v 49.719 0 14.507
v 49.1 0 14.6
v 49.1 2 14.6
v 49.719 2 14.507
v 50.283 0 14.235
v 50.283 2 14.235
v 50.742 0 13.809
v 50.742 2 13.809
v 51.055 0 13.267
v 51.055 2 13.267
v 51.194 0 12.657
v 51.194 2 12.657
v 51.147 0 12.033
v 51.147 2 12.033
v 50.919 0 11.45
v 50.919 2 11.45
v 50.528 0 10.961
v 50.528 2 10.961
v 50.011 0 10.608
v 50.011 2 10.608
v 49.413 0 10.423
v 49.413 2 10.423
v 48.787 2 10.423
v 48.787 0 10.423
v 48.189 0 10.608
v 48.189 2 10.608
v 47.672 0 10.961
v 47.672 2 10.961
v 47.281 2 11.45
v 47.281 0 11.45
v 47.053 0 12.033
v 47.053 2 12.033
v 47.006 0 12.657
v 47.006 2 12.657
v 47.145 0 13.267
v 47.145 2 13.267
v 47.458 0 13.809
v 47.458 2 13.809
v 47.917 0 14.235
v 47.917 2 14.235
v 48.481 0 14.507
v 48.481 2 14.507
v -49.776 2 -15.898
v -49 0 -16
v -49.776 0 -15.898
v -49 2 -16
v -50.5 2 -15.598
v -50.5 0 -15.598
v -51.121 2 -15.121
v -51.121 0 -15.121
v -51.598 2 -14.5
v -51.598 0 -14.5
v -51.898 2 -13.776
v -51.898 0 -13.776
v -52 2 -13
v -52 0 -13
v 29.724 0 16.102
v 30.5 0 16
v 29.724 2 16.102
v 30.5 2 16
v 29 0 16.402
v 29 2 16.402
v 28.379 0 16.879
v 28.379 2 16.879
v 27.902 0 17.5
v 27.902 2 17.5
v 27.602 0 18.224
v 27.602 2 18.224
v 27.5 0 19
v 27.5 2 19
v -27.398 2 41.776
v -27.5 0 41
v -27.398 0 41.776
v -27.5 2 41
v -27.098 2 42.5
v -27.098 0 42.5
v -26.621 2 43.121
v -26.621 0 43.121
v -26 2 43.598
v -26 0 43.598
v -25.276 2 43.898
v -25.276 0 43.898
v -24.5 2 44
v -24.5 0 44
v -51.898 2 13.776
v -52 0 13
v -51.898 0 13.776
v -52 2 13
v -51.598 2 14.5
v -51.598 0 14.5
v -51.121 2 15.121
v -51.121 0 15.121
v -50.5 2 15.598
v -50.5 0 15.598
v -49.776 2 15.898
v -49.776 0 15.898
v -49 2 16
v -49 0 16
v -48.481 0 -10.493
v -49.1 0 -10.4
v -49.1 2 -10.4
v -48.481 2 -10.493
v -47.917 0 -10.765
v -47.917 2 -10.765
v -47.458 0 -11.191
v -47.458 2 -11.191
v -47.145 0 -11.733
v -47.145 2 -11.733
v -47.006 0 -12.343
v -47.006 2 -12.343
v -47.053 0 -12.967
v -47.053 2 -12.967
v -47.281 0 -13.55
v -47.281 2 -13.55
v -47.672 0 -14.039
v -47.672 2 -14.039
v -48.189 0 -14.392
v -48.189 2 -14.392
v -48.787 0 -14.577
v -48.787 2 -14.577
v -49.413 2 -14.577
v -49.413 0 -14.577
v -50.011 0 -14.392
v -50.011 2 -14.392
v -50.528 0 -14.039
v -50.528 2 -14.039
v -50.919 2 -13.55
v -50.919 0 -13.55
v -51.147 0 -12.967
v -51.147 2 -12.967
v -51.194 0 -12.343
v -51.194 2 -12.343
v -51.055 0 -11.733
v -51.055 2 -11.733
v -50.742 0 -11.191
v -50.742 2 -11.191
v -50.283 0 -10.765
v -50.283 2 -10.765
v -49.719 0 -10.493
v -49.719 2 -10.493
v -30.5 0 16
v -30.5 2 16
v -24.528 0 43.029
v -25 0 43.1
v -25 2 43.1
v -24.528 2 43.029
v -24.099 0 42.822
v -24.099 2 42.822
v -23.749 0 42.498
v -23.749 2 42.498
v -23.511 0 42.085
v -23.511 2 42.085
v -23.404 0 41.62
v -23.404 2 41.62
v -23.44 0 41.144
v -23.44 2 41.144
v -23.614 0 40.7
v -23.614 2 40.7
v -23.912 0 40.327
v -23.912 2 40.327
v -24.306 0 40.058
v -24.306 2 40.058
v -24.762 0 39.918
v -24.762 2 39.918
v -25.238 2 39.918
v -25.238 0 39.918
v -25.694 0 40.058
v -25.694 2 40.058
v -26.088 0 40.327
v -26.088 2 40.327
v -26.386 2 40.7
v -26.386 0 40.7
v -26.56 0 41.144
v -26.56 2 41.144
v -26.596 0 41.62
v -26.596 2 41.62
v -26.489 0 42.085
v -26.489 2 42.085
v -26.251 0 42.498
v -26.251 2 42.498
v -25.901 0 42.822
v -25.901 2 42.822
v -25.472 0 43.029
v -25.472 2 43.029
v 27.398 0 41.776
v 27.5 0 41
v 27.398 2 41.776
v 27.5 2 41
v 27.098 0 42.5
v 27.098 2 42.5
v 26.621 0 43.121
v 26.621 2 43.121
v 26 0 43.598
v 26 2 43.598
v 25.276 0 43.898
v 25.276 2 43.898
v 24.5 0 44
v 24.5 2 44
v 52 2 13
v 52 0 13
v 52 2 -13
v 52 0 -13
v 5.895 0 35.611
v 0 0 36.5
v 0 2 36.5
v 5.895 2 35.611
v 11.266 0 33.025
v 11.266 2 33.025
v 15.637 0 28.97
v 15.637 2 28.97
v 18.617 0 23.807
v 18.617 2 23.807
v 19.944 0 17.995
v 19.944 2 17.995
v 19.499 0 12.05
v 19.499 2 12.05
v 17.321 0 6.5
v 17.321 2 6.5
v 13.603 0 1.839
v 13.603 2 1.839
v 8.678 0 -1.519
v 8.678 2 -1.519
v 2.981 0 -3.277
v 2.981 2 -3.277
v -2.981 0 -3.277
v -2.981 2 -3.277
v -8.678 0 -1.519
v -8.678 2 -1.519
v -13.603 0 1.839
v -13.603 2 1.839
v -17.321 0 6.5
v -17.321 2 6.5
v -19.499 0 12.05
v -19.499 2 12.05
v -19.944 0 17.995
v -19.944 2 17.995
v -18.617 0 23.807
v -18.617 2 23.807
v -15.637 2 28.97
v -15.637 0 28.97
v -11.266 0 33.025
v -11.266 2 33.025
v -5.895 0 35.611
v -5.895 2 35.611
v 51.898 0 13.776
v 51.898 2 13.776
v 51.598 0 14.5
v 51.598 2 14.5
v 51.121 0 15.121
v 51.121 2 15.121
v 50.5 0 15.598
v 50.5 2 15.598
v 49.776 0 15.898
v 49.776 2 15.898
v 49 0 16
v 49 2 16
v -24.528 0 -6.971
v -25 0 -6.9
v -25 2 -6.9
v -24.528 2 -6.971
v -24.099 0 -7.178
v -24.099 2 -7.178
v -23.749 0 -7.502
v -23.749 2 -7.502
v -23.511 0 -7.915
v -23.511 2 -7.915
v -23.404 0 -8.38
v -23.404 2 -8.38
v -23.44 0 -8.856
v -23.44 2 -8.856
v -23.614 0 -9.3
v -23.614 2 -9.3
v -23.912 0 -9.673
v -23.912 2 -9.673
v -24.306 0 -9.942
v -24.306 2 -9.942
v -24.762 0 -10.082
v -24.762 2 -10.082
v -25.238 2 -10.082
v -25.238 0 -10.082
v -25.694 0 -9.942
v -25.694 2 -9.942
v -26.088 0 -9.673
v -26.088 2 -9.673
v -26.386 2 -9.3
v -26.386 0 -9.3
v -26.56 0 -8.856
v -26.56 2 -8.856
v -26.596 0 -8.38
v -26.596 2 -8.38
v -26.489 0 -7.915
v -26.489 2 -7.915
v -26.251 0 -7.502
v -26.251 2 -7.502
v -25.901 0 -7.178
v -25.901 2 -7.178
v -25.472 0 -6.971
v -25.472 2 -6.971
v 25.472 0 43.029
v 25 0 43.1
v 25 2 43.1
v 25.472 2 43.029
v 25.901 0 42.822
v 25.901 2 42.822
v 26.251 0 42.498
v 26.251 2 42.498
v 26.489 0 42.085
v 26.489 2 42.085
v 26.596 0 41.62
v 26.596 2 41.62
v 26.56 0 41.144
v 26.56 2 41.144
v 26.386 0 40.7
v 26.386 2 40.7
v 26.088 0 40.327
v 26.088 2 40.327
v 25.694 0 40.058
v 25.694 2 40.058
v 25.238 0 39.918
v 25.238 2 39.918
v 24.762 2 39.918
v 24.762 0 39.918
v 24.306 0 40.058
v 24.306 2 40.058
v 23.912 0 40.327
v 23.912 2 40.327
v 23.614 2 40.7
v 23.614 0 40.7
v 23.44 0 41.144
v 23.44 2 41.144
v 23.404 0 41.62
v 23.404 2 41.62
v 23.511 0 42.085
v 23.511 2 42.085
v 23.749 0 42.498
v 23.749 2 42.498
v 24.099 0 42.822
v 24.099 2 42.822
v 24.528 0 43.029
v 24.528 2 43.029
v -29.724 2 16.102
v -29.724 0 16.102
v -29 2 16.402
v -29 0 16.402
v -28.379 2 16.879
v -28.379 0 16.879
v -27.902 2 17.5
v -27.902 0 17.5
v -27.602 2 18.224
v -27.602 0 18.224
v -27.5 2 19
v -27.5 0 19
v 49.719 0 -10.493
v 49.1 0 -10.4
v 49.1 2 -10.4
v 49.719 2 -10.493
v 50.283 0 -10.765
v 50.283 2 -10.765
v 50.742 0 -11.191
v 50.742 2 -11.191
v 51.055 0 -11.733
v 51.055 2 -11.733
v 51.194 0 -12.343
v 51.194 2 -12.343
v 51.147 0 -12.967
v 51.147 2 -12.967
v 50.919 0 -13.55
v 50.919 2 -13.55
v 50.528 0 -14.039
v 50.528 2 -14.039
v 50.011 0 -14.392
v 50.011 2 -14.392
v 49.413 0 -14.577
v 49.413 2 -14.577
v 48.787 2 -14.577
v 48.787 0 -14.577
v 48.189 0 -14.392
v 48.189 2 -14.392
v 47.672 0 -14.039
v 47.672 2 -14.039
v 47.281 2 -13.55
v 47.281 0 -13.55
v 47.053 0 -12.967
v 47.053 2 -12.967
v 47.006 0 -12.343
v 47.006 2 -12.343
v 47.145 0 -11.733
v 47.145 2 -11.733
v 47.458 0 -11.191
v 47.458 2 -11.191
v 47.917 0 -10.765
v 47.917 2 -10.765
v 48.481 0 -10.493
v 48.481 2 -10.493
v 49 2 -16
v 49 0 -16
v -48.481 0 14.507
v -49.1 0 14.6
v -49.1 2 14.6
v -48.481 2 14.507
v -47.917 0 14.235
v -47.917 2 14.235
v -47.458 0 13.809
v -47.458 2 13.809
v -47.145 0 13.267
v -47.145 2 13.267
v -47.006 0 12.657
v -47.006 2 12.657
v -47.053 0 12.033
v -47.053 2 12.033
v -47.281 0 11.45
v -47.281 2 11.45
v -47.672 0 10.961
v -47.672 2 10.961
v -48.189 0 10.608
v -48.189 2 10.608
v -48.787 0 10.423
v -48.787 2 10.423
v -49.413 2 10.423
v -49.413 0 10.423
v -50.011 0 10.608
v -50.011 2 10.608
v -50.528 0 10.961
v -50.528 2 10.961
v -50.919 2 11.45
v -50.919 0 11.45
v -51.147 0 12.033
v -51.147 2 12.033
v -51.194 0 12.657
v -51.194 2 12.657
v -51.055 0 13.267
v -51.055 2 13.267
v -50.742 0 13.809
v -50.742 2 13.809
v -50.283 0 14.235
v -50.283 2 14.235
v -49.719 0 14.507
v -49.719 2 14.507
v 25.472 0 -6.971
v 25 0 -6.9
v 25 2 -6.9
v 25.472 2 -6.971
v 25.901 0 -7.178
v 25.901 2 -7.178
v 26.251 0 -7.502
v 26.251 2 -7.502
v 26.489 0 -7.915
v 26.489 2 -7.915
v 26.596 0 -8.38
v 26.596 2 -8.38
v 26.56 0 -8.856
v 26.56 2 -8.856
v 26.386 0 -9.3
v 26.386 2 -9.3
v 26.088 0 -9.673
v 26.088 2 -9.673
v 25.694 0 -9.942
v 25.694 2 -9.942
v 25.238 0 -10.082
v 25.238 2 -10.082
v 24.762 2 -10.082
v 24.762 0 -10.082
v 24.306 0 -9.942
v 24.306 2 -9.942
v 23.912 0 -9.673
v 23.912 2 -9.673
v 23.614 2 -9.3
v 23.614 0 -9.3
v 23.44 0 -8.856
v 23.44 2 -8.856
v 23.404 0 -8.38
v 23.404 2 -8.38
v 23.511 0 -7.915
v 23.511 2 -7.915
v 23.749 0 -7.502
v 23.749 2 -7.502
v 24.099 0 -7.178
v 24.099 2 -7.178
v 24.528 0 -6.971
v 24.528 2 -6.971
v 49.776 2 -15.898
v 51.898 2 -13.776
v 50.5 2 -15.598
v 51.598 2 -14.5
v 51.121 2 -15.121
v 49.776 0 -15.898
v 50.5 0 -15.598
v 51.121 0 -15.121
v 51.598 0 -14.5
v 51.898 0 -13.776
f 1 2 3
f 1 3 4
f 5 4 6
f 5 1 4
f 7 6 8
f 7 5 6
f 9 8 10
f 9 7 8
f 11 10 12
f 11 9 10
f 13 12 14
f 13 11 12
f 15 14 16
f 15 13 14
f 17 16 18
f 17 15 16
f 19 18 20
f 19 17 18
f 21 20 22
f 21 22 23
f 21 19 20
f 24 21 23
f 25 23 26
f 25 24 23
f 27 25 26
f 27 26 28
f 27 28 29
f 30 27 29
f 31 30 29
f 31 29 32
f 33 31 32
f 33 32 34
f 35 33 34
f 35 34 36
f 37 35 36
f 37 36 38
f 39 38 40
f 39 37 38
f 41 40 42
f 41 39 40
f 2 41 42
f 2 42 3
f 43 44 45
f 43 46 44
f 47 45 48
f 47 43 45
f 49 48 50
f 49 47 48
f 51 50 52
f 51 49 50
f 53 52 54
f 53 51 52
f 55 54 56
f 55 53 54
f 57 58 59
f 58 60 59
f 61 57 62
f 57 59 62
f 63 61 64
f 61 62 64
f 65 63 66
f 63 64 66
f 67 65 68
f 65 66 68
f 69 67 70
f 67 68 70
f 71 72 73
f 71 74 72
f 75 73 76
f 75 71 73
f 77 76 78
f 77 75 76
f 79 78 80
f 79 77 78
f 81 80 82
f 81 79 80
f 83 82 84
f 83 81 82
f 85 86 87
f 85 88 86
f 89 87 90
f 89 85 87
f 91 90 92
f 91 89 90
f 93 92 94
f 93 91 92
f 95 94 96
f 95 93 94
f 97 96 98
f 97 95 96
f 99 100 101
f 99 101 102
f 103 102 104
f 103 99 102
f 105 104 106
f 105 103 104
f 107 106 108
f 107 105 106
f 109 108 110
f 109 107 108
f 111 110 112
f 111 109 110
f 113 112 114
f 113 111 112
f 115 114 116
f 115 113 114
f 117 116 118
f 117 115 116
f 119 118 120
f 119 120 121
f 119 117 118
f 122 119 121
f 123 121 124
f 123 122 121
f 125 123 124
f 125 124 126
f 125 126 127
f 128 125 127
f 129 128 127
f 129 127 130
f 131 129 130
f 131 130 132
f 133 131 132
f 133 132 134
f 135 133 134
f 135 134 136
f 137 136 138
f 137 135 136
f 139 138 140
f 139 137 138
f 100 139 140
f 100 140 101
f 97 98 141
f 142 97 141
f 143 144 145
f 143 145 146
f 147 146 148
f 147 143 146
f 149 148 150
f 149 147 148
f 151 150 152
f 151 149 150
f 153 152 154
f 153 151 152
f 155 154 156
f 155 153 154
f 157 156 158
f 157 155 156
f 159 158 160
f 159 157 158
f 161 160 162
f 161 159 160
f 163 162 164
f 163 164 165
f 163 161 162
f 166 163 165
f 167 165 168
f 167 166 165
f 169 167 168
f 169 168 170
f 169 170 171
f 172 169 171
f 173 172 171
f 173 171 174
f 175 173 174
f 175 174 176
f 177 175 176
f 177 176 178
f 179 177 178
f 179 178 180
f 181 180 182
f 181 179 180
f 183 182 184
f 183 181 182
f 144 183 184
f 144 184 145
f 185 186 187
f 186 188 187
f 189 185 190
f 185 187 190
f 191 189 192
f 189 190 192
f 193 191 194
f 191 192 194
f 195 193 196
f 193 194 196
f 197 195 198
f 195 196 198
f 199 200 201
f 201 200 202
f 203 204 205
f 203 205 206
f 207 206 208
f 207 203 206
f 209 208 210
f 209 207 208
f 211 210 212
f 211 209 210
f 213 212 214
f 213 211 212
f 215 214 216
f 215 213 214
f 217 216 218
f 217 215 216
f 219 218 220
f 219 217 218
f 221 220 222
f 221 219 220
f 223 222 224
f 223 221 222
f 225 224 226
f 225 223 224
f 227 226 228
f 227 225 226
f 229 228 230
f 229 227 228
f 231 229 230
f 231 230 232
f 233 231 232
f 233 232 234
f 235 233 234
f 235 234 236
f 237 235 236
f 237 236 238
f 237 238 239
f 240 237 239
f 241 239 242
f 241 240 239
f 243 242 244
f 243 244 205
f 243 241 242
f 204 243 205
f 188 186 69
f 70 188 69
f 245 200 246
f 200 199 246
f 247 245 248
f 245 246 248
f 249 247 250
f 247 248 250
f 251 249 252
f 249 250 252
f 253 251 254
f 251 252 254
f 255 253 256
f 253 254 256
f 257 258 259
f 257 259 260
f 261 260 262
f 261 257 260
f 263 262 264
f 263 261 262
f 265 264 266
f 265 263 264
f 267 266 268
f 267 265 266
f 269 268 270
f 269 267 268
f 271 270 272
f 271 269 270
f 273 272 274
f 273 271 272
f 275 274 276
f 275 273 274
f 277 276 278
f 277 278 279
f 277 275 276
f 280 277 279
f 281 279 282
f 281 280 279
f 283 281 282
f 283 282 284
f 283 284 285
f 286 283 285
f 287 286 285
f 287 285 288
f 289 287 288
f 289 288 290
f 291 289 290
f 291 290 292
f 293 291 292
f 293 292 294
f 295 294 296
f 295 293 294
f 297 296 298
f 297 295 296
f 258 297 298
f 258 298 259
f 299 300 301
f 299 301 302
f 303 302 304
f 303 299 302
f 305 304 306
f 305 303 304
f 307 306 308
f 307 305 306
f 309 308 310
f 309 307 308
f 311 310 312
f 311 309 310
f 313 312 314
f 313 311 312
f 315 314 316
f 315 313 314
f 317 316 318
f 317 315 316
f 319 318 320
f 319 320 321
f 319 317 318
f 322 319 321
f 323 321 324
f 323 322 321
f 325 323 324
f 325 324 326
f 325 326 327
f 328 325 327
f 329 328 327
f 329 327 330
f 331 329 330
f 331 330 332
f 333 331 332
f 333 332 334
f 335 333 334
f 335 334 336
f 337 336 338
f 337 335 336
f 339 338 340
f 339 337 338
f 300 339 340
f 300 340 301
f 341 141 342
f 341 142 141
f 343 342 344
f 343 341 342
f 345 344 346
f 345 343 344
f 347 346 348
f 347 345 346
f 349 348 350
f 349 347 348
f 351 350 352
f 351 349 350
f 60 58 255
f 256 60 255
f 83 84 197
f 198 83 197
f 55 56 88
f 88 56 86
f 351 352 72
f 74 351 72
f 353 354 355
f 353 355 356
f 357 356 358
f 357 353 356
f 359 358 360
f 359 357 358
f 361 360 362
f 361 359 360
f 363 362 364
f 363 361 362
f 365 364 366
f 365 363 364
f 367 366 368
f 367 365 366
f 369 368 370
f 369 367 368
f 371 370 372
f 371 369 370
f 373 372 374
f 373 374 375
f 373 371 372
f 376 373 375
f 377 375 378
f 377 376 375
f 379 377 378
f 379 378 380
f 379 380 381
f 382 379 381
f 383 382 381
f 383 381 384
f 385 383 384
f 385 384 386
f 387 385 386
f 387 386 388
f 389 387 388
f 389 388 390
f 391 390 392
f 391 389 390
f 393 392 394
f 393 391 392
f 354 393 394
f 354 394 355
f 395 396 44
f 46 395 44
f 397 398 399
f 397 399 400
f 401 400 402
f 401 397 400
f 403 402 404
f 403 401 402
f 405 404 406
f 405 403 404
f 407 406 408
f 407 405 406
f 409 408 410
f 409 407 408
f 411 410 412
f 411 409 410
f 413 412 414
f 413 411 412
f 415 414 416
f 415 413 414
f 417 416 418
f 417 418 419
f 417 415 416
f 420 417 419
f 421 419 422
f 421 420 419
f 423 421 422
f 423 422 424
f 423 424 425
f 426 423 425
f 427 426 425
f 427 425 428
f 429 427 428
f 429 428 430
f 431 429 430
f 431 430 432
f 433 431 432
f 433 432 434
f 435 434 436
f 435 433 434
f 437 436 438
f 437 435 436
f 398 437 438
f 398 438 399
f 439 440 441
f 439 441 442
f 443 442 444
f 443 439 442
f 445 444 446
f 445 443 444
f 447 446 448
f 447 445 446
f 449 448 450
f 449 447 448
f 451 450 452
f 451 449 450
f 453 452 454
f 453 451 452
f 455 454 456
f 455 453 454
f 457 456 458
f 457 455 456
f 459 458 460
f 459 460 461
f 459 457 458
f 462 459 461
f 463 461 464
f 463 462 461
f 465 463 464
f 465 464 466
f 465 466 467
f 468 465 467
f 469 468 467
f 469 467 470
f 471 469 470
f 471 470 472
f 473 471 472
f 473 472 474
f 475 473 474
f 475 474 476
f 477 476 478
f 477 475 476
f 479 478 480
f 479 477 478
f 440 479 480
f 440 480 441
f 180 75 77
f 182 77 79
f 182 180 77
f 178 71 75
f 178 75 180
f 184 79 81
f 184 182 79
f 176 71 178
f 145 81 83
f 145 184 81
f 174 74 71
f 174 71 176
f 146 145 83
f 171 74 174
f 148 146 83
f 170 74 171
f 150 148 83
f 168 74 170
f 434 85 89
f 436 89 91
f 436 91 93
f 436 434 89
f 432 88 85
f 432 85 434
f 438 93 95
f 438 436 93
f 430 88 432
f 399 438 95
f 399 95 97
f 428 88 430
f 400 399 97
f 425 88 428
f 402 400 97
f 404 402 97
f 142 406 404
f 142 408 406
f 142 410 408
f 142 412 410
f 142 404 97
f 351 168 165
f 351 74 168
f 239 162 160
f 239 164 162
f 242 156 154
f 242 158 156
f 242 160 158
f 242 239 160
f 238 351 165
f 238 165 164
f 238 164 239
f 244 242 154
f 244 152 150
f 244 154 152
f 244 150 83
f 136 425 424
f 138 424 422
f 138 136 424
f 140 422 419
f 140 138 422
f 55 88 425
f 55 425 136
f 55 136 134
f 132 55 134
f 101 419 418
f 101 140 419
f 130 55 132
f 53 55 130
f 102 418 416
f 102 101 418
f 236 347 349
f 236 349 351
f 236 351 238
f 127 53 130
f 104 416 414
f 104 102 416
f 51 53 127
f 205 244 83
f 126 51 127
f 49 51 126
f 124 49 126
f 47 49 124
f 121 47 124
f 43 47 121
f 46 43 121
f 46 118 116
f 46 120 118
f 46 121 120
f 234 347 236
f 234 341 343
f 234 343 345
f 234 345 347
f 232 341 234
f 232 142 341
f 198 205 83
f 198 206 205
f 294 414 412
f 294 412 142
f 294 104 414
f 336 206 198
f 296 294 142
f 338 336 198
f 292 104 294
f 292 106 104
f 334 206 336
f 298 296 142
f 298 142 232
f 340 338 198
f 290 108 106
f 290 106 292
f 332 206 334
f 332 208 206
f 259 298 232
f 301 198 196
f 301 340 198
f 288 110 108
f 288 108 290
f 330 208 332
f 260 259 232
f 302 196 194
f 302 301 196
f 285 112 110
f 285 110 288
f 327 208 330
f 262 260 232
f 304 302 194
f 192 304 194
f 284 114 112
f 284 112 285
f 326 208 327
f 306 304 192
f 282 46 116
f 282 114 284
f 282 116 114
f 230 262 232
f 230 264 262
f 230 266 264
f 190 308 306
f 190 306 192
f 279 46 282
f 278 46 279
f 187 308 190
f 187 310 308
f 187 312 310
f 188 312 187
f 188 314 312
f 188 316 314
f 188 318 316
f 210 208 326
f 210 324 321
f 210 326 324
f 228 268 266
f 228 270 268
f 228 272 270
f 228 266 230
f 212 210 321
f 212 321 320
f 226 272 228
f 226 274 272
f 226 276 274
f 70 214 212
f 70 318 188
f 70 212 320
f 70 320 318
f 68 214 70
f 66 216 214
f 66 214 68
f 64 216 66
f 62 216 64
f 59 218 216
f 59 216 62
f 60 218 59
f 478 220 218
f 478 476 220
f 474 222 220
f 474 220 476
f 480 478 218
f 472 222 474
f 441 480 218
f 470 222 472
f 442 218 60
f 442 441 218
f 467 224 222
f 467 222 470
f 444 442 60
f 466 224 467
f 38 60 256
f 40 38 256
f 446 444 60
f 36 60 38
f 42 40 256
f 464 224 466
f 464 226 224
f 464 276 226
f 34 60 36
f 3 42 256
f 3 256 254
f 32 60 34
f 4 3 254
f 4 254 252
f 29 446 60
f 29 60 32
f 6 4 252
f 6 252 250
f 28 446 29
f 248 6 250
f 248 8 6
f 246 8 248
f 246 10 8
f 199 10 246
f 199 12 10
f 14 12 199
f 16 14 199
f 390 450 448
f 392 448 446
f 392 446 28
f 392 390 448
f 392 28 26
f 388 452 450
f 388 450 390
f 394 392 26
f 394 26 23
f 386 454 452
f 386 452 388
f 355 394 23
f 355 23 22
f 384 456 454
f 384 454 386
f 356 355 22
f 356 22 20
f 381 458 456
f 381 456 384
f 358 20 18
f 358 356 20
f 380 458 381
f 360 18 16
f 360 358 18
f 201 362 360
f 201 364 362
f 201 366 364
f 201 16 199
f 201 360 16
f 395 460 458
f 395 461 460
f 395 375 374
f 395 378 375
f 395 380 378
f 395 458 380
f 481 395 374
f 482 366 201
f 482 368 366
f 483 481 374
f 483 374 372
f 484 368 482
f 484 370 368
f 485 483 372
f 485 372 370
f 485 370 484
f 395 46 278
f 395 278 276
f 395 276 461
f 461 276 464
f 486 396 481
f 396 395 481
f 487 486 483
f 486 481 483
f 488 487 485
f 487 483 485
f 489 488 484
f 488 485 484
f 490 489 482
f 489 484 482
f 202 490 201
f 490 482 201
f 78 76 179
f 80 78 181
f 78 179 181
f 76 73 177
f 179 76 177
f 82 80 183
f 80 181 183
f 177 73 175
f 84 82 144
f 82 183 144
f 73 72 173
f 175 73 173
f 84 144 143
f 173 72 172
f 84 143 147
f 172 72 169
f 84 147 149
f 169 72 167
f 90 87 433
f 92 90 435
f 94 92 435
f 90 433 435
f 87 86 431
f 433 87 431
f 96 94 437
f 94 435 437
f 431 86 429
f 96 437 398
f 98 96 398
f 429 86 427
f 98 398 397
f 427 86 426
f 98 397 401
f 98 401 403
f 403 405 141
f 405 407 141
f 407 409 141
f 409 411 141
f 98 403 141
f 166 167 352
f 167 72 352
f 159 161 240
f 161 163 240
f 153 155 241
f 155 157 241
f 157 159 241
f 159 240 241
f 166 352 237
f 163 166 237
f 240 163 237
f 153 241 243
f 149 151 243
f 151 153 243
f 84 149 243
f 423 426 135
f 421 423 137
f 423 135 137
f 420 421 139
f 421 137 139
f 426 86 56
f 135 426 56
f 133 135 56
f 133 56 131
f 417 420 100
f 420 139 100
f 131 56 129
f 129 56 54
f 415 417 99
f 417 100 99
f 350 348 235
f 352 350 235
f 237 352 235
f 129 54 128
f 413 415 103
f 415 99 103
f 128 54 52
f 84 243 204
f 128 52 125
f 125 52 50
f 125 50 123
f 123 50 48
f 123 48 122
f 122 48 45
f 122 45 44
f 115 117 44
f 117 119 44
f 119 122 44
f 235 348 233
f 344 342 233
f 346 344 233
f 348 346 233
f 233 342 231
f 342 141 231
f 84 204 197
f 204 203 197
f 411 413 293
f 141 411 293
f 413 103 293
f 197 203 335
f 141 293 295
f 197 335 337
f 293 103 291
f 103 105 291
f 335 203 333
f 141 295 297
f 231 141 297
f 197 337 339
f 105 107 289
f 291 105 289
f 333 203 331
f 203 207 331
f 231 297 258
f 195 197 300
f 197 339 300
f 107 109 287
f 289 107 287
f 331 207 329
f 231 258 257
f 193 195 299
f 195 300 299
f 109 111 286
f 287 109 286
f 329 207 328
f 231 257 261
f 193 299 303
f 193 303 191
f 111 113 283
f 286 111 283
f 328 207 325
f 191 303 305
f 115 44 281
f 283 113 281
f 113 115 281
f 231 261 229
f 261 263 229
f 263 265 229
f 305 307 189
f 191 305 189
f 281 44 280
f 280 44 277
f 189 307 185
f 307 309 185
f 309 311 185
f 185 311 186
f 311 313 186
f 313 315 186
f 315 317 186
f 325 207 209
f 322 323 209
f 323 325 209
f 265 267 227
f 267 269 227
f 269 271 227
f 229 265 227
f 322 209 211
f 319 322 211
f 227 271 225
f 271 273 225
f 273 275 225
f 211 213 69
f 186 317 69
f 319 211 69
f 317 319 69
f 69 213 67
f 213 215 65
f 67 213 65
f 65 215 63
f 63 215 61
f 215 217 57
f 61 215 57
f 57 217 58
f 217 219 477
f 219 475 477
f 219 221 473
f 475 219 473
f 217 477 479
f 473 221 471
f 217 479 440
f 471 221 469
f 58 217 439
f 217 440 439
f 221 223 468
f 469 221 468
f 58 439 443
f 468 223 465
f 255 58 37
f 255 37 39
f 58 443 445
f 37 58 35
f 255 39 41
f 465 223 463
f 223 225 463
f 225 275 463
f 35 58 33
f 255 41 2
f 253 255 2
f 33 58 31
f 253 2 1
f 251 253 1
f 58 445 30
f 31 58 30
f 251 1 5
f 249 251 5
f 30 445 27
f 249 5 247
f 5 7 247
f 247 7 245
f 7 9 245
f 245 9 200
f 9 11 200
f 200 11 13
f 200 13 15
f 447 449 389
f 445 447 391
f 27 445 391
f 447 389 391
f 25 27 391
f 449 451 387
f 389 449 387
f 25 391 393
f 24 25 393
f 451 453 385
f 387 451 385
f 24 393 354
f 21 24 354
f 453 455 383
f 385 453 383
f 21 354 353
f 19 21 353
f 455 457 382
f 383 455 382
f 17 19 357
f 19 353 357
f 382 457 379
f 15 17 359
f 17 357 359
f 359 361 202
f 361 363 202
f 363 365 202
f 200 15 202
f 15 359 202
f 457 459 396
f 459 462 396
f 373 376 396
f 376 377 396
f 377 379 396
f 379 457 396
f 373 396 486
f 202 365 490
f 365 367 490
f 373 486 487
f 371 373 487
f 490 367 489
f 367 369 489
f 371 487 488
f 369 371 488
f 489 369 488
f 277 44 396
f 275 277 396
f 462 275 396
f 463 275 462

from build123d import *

# Parameters (mm, degrees)
SKETCH_1_R      = 1.6
SKETCH_1_R_2    = 20
SKETCH_1_R_3    = 2.1
EXTRUDE_1_DEPTH = 2
FILLET_1_R      = 3


with BuildPart() as part:
    # 草图1 → 凸台-拉伸1 (new body)
    with BuildSketch(Plane(origin=(0, 0, 0), x_dir=(1, 0, 0), z_dir=(0, 1, 0))):
        Polygon((52, 16), (-52, 16), (-52, -16), (-27.5, -16), (-27.5, -44), (27.5, -44), (27.5, -16), (52, -16), align=None)
        with Locations(Location((25, -41.5, 0), (0, 0, 270))):
            Circle(SKETCH_1_R, mode=Mode.SUBTRACT)
        with Locations(Location((-25, -41.5, 0), (0, 0, 270))):
            Circle(SKETCH_1_R, mode=Mode.SUBTRACT)
        with Locations(Location((0, -16.5, 0), (0, 0, 270))):
            Circle(SKETCH_1_R_2, mode=Mode.SUBTRACT)
        with Locations(Location((-49.1, -12.5, 0), (0, 0, 270))):
            Circle(SKETCH_1_R_3, mode=Mode.SUBTRACT)
        with Locations(Location((-49.1, 12.5, 0), (0, 0, 270))):
            Circle(SKETCH_1_R_3, mode=Mode.SUBTRACT)
        with Locations(Location((-25, 8.5, 0), (0, 0, 270))):
            Circle(SKETCH_1_R, mode=Mode.SUBTRACT)
        with Locations(Location((49.1, -12.5, 0), (0, 0, 270))):
            Circle(SKETCH_1_R_3, mode=Mode.SUBTRACT)
        with Locations(Location((25, 8.5, 0), (0, 0, 270))):
            Circle(SKETCH_1_R, mode=Mode.SUBTRACT)
        with Locations(Location((49.1, 12.5, 0), (0, 0, 270))):
            Circle(SKETCH_1_R_3, mode=Mode.SUBTRACT)
    extrude(amount=EXTRUDE_1_DEPTH)

    # 圆角1
    fillet_1_edges = [part.edges().sort_by_distance(p)[0] for p in [
        (27.5, 1, 44),
        (-27.5, 1, 44),
        (-27.5, 1, 16),
        (-52, 1, 16),
        (-52, 1, -16),
        (52, 1, -16),
        (52, 1, 16),
        (27.5, 1, 16),
    ]]
    fillet(fillet_1_edges, radius=FILLET_1_R)


solid = part.part
